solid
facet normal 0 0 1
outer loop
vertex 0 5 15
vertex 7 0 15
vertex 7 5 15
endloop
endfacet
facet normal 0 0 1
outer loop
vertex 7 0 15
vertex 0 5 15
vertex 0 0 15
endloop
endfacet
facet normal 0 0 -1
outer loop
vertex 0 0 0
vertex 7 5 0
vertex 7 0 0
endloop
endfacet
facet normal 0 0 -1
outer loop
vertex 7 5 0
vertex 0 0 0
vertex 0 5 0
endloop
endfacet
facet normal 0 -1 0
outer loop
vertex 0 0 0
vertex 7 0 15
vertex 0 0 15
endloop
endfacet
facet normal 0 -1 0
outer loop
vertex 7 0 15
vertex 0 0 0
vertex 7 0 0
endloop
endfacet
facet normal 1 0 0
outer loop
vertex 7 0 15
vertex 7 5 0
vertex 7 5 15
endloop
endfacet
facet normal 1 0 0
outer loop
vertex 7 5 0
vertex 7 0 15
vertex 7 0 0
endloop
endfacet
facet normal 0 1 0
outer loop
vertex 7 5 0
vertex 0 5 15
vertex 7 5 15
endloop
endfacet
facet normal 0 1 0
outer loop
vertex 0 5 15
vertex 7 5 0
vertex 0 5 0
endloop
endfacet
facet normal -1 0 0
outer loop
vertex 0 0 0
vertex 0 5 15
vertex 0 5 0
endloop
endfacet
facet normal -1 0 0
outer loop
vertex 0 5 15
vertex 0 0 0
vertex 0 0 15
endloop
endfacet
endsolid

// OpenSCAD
// Generated by SolidPython 1.0.1 on 2020-07-29 00:46:55


cube(size = [7, 5, 15]);
/***********************************************
*********      SolidPython code:      **********
************************************************
 
# import packages: SolidPython
from solid import *
from solid.utils import *
from itertools import chain, combinations, permutations


class Resize:

    def __init__(self, scad_file):
        self.scad_file = scad_file
        #self.scad_file = import_scad(scad_file)
        # cone/cylinder param:
        self.r1 = 0
        self.r2 = 0
        self.h = 0
        # rectangular prism param:
        self.w = 0
        self.l = 0
        # ellipse param:
        self.r = 0

    # import OpenScad code (file name corresponds to shape)


    # classify shape + parameters
    def assign(self, param1, param2, param3):
        if self.scad_file == 'cone.scad':
            self.r1 = param1
            self.r2 = param2
            self.h = param3
        elif self.scad_file == 'cylinder.scad':
            self.r1 = param1
            self.r2 = param2
            self.h = param3
        elif self.scad_file == 'rectangularPrism.scad':
            self.h = param1
            self.l = param2
            self.w = param3
        else:
            self.r = param1
            self.h = param2

    # resize parameters
    def iterate(self):
        x = range(3, 20, 2)
        i = 1
        if self.scad_file == 'cone.scad':
            tempList = list(permutations(x, 2))
            for temp in tempList:
                param1 = temp[0]
                param2 = temp[1]
                filepath = 'produced_scad_files/' + 'cone' + str(param1) + '_' + str(param2) + '_' + '.scad'
                scad_render_to_file(cylinder(h=param1, r1=param2, r2=0), filepath)

        elif self.scad_file == 'cylinder.scad':
            tempList = list(permutations(x, 3))
            for temp in tempList:
                param1 = temp[0]
                param2 = temp[1]
                filepath = 'produced_scad_files/' + 'cylinder' + str(param1) + '_' + str(param2) + '_' + '.scad'
                scad_render_to_file(cylinder(h=param1, r1=param2, r2=param2), filepath)

        elif self.scad_file == 'rectangularPrism.scad':
            tempList = list(permutations(x, 3))
            for temp in tempList:
                param1 = temp[0]
                param2 = temp[1]
                param3 = temp[2]
                filepath = 'produced_scad_files/' + 'rectangularPrism' + str(param1) + '_' + str(param2) + '_' + str(
                    param3) + '.scad'
                scad_render_to_file(cube(size=(param1, param2, param3)), filepath)

        elif self.scad_file == 'ellipse.scad':
            tempList = list(permutations(x, 4))
            for temp in tempList:
                param1 = temp[0]
                param2 = temp[1]
                param3 = temp[2]
                param4 = temp[3]
                filepath = 'produced_scad_files/' + 'ellipse' + str(param1) + '_' + str(param2) + '_' + str(param3) + '_' + str(param4) + '.scad'
                scad_render_to_file(scale([param1, param2, param3])(sphere(r=param4)), filepath)

    def render_to_scadfile(self):
        scad_render_to_file(scad, 'example.scad') 
 
************************************************/
